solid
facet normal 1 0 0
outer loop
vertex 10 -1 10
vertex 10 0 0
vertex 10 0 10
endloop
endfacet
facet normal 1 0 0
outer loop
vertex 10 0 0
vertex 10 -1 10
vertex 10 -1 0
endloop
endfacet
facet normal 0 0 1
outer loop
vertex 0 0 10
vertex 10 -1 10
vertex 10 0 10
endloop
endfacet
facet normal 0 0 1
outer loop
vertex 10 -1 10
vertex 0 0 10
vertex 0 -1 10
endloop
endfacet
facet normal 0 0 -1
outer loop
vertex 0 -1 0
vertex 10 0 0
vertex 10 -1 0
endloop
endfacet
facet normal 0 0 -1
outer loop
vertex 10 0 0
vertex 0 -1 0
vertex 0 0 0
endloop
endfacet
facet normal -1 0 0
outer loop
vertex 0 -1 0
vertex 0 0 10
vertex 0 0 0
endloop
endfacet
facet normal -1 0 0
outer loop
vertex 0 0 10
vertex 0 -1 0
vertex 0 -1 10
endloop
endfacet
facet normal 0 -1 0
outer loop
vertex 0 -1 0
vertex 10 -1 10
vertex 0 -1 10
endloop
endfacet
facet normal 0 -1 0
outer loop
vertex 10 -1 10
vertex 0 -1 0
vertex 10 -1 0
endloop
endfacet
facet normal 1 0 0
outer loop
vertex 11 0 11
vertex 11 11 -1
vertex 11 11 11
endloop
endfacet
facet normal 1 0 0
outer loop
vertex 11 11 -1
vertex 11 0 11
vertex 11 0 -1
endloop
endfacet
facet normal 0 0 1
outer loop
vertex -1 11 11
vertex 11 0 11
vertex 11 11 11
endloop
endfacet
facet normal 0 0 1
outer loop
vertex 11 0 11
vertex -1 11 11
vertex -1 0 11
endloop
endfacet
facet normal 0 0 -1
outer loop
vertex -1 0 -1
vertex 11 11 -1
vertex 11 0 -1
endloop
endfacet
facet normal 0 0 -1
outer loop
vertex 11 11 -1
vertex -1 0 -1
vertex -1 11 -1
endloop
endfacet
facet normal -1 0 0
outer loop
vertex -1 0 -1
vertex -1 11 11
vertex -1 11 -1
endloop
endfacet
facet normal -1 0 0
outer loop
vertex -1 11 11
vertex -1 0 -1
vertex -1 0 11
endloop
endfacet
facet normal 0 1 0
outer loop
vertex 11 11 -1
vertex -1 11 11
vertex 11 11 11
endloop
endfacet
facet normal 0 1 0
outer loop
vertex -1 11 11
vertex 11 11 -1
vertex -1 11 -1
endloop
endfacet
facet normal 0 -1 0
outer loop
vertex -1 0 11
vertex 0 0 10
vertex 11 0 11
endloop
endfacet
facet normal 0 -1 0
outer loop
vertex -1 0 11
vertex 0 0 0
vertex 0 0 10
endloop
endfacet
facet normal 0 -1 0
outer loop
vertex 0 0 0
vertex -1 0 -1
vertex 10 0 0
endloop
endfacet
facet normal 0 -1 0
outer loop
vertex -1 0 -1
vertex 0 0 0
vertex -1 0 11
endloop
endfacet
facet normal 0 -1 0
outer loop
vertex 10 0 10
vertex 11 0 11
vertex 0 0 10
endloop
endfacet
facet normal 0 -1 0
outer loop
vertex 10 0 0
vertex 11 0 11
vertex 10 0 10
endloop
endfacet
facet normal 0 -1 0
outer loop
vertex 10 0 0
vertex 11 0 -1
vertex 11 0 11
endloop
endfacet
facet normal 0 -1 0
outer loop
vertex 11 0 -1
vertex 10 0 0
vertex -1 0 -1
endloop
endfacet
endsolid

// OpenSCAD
// Unit of length: Unit.MM
union()
{
   color(c = [1.0, 0.0, 0.0, 1.0])
   {
      translate(v = [0.0, -1.0, 0.0])
      {
         cube(size = [10.0, 11.0, 10.0], center = false);
      }
   }
   translate(v = [-1.0, 0.0, -1.0])
   {
      cube(size = [12.0, 11.0, 12.0], center = false);
   }
}
